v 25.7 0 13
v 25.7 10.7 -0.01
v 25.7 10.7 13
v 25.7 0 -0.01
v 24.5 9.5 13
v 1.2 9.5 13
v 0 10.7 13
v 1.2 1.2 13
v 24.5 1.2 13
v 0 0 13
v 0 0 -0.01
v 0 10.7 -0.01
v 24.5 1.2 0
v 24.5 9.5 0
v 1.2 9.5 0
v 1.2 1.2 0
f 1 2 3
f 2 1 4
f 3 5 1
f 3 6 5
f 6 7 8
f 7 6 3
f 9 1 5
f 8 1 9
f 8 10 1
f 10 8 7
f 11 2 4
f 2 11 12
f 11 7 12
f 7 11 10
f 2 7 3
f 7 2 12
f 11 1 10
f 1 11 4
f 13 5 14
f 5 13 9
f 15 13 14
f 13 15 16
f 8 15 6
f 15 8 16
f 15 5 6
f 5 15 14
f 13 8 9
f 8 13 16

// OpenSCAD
// file: ../Base/Boxes.scad
// Fischertechnik Box Foundation
// Pre-designed Boxes

use <Constants.scad>

include <PlacementOptions.scad>

box190Width = 190;
box190Depth = 130;
box130Width = 130;
box130Depth = 95;
boxUsageHeight = 33.9;
boxWallThickness = 2.4;
boxBaseThickness = 1.0;

// getBoxWallThickness()
// Gets the wall thickness of a Fischertechnik Box

function getBoxWallThickness() = boxWallThickness;

// Gets the usable height of a fischertechnik box
function getBoxUsageHeight() = boxUsageHeight;

// Gets the thickness of the Fischertechnik box base.
function getBoxBaseThickness() = boxBaseThickness;

// Gets the usable inner space of a Box 190 as an x/y-list
function getBox190Space() = [
    box190Width - 2*getBoxWallThickness(), 
    box190Depth - 2*getBoxWallThickness() ];

// Imports the Fischertechnik empty box 130x190 mm and places it at position 0,0
// 190x130 are the outer sizes, the inner space is slightly smaller. Use getBox190Space() to get the inner sizes.
// This module needs the STL file "Fischertechnik Box 130x190.stl" in the library path.
// The box is positioned that the usable inner space is at the 0,0,0 position. The

module Box190() {
    translate([-getBoxWallThickness(),-getBoxWallThickness(),-getBoxBaseThickness()])
        import("Fischertechnik Box 130x190.stl", convexity=3);
}

// Gets the usable inner space of a Box 130 as an x/y-list
function getBox130Space() = [
    box130Width - 2*getBoxWallThickness(), 
    box130Depth - 2*getBoxWallThickness() ];

// Imports the Fischertechnik empty box 95x130 mm and places it at position 0,0
// 190x130 are the outer sizes, the inner space is slightly smaller. Use getBox190Space() to get the inner sizes.
// This module needs the STL file "Fischertechnik Box 95x130.stl" in the library path.
// The box is positioned that the usable inner space is at the 0,0,0 position. The

module Box130() {
    translate([-getBoxWallThickness(),-getBoxWallThickness(),-getBoxBaseThickness()])
        import("Fischertechnik Box 95x130.stl", convexity=3);
}

// Creates a web at the specified box walls
// corner 0 = LowerLeft, 1 = UpperLeft, 2 = UpperRight, 3 = LowerRight
// side 0 = LeftOfCorner, 1 = RightOfCorner
// distance = Distance in mm from the corner
// box = inner width and depth of the box (default: Box 190)
// webWidth = length of the web (default is 3 mms)
// webThickness = thickness of the web (default is 1 mm)

module BoxWeb(corner, side, distance, box=getBox190Space(), webWidth=3, webThickness=1.0) {
    sink = getBoxWallThickness()/2;

    width = (corner % 2 == 0) ? 
            (side == LeftOfCorner ? webWidth : webThickness) :
            (side == LeftOfCorner ? webThickness : webWidth);

    depth = (corner % 2 == 0) ? 
            (side == RightOfCorner ? webWidth : webThickness) :
            (side == RightOfCorner ? webThickness : webWidth);
    
    xDiff = corner == LowerLeft ? 
                (side == LeftOfCorner ? -sink : distance) :
            (corner == UpperLeft ?                
                (side == LeftOfCorner ? distance : -sink) :
            (corner == UpperRight ?
                (side == LeftOfCorner ? box.x-webWidth+sink : box.x-distance-webThickness) :
                (side == LeftOfCorner ? box.x-distance-webThickness: box.x-webWidth+sink)));

    yDiff = corner == LowerLeft ? 
                (side == RightOfCorner ? -sink : distance) :
            (corner == UpperLeft ?
                (side == RightOfCorner ? box.y-distance : box.y-webWidth+sink) :
            (corner == UpperRight ?
                (side == RightOfCorner ? box.y-webWidth+sink : box.y-distance) :
                (side == RightOfCorner ? distance : -sink)));
    
    translate([xDiff, yDiff, -getExcess()])
        cube([width, depth, boxUsageHeight + 2*getExcess()]);
}
// file: ../Base/Rotation.scad
// Fischertechnik Box Foundation
// Geometry Helpers Rotation

include <PlacementOptions.scad>

// getRotatedSpace(space, rotation=NoRotation)
// Rotates the space dependent on the specified rotation

function getRotatedSpace(space, rotation=NoRotation) = [
    (rotation == Rotate90 || rotation == Rotate270) ? space.y : space.x,
    (rotation == Rotate90 || rotation == Rotate270) ? space.x : space.y
];

// Rotates the given space around the fixed left lower corner
// space = the space the children needs as width/depth list [width,depth]
// rotation = 0 Rotate0 degrees, 1 Rotate90 degrees, 2 Rotate180 degrees, 3 Rotate270 degrees (equivalent to -90)

module RotateFix(space, rotation=Rotate0) {
    dy = (rotation == Rotate0 || rotation == Rotate270) ? 0 :
        (rotation == Rotate90) ? space.x :
        space.y;
    dx = (rotation < Rotate180) ? 0 :
        (rotation == Rotate180) ? space.x :
        space.y;
    
    translate([dx, dy, 0])
        rotate([0, 0, rotations[rotation]])
            children();
}
// file: ../Base/Alignment.scad
// Fischertechnik Box Foundation
// Geometry Helpers Alignment

include <PlacementOptions.scad>

// getAlignedX(elementWidth, spaceWidth, align=AlignRight, offset=0)
// Gets the aligned X offset of an element with the given
// width in the given space.
// elementWidth = The width of the element to positon
// spaceWidth = The space where the element should be aligned
// align = 0 AlignLeft, 1 AlignCenter, 2 AlignRight
// offset = an optional offset from the aligned position. When
// aligned left or centered, then positive values are in X direction.
// When aligned right then positive values are in negative X direction.

function getAlignedX(elementWidth, spaceWidth, align=AlignRight, offset=0) =
    (align == AlignLeft) ?
        offset :
        ((align == AlignCenter) ?
        (spaceWidth - elementWidth)/2 + offset :
        spaceWidth - offset - elementWidth);

// getAlignedY(elementDepth, spaceDepth, align=AlignTop, offset=0)
// Gets the aligned Y offset of an element with the given
// depth in the given space.
// elementDepth = The depth of the element to positon
// spaceDepth = The space where the element should be aligned
// align = 0 AlignBottom, 1 AlignCenter, 2 AlignTop
// offset = an optional offset from the aligned position. When
// aligned bottom or centered, then positive values are in Y direction.
// When aligned top then positive values are in negative Y direction.

function getAlignedY(elementDepth, spaceDepth, align=AlignTop, offset=0) =
    (align == AlignBottom) ?
        offset :
        ((align == AlignCenter) ?
        (spaceDepth - elementDepth)/2 + offset :
        spaceDepth - offset - elementDepth);
// file: ../Base/PlacementOptions.scad
// Fischertechnik Box Foundation
// Placement Options

// Alignment
NoAlign = 0;
AlignLeft = 1;
AlignBottom = 2;
AlignCenter = 3;
AlignRight = 4;
AlignTop = 5;

// Element rotation degree steps
rotations = [0, -90, -180, -270];

// Rotation
NoRotation = 0;
Rotate0 = 0;
Rotate90 = 1;
Rotate180 = 2;
Rotate270 = 3;

// Docking (seen from above)
NoDock = -1;
DockLeft = 0;
DockTop = 1;
DockRight = 2;
DockCorner = 2;
DockBottom = 3;

// Web corners
LowerLeft = 0;
UpperLeft = 1;
UpperRight = 2;
LowerRight = 3;

// Web position relative to corner
LeftOfCorner = 0;
RightOfCorner = 1;
// file: ../Base/Placement.scad
// Fischertechnik Box Foundation
// Geometry Helpers Placement

use <Constants.scad>
use <Alignment.scad>
use <Rotation.scad>
use <Boxes.scad>

include <PlacementOptions.scad>

// Place(x=0, y=0, elementSpace=[0,0], alignX=AlignLeft, alignY=AlignBottom, rotation=Rotate0, boxSpace=getBox190Space())
// Places the child at the specified position
// y = Y-Position. This is a relative position when an X aligment is specified.
// x = X-Position. This is a relative position when an Y aligment is specified.
// elementSpace = space of the element to be placed [x,y]
// alignX = -1=NoAlign, 0 AlignLeft, 1 AlignCenter, 3 AlignRight (elementSpace and boxSpace required!)
// alignY = -1=NoAlign, 2 AlignBottom, 1 AlignCenter, 4 AlignTop (elementSpace and boxSpace required!)
// rotation = 0 Rotate0 0 degrees, 1 Rotate90 90 degrees, 
// 2 Rotate180 180 degrees, 3 Rotate270 270 degrees (equivalent to -90)
// boxSpace = Inner space of the box where the placement occurs [x,y] - default is Box 190x130 inner space

module Place(x=0, y=0, elementSpace=[0,0], 
  alignX=AlignLeft, alignY=AlignBottom, 
  rotation=NoRotation, boxSpace=getBox190Space()) {

    module Position(x, y, space, rotation=Rotate0) {
        translate([x, y, 0])
            RotateFix(space, rotation)
                children(0);
    }

    space = getRotatedSpace(elementSpace, rotation);
    alignedX = getAlignedX(space.x, boxSpace.x, alignX, x);
    alignedY = getAlignedY(space.y, boxSpace.y, alignY, y);
    Position(alignedX, alignedY, elementSpace, rotation)
        children(0);
}

// Center(space=getBox130Space(), elementSpace=[0,0])
// space = Space where the children is centered. For cylinder use centered=true and no elementSpace.
// elementSpace = space of the element to be centered [x,y]

module Center(space=getBox190Space(), elementSpace=[0,0]) {
    translate([(space.x - elementSpace.x) / 2, (space.y - elementSpace.y) / 2])
        children(0);
}

// CenterHorizontal(width=0, y=0, offset=0, space=getBox130Space())
// space = Space where the children is centered. For cylinder use centered=true and no elementSpace.
// elementSpace = space of the element to be centered [x,y]

module CenterHorizontal(width=0, y=0, offset=0, space=getBox190Space()) {
    translate([(space.x - width) / 2 + offset, y])
        children(0);
}

// CenterVertical(depth=0, x=0, offset=0, space=getBox130Space())
// space = Space where the children is centered. For cylinder use centered=true and no elementSpace.
// elementSpace = space of the element to be centered [x,y]

module CenterVerticalal(depth=0, x=0, offset=0, space=getBox190Space()) {
    translate([x, (space.y - depth) / 2 + offset])
        children(0);
}
// file: ../Base/Constants.scad
// Fischertechnik Box Foundation
// Constants

// Constant values necessary for multiple elements

// Base constants
dividerThickness = 1.2;
excess = 0.01;
fragments = 90;
tolerance = 0.8;

// Gets the thickness of a divider 
function getDividerThickness() = dividerThickness;

// Gets the excess that is used to merge walls into each other
function getExcess() = excess;

// Gets amount of fragments of a cylinder
function getFragments() = fragments;

// Gets the inner tolerance of a frame to each side
function getTolerance() = tolerance;


// Fischertechnik specific constants
axisDiameter = 4;
axisBottomDiameter = axisDiameter + 1;
standardEdgeDistance = 2.5;
standardWebDistance = 11.5;
standardCornerLength = 15;
tubeWallFactor = 1.6;

// Gets axis diameter
function getAxisDiameter() = axisDiameter;

// Gets axis bottom diameter for thicker part at the bottom
function getAxisBottomDiameter() = axisBottomDiameter;

// gets the standard distance to the wall of the box for dockable frames with webs
function getStandardEdgeDistance() = standardEdgeDistance;

// gets the standard distance of each web to the corner of the dockable frame
function getStandardWebDistance() = standardWebDistance;

// gets the standard length of the corner walls of a dockable frame
function getStandardCornerLength() = standardCornerLength;

// gets the wall thickness of a tube.
function getTubeWallThickness() = tubeWallFactor * getDividerThickness();
// main file
// Fischertechnik Box Library
// Frame for Pulley
// 35795

use <../ModelBase/Simple.scad>

width = 22.5;
depth = 7.5;
height = 13;

// getFramePulleySpace(columns=1, rows=1)
// Gets the space the frame pulley needs as width and depth (.x and .y as a list)
// columns = Count of pulleys in X direction, small side
// rows = Count of pulleys in Y direction

function getFramePulleySpace(columns=1, rows=1) = getFrameOuterVolume([width*columns, depth*rows, height]);

// FramePulley(columns=1, rows=1)
// columns = Count of pulleys in X direction
// rows = Count of pulleys in Y direction
// The walls of the frame are 13 mm high. The small side of the pulley
// is 7.5 mm wide, the large side is 22.5 mm wide.
// The complete frame has a tolerance of addition 1 mm in each direction.

module FramePulley(columns=1, rows=1) {
    Frame([width*columns, depth*rows, height]);
}

// Tests
color("lightgray") {
    FramePulley();
}
